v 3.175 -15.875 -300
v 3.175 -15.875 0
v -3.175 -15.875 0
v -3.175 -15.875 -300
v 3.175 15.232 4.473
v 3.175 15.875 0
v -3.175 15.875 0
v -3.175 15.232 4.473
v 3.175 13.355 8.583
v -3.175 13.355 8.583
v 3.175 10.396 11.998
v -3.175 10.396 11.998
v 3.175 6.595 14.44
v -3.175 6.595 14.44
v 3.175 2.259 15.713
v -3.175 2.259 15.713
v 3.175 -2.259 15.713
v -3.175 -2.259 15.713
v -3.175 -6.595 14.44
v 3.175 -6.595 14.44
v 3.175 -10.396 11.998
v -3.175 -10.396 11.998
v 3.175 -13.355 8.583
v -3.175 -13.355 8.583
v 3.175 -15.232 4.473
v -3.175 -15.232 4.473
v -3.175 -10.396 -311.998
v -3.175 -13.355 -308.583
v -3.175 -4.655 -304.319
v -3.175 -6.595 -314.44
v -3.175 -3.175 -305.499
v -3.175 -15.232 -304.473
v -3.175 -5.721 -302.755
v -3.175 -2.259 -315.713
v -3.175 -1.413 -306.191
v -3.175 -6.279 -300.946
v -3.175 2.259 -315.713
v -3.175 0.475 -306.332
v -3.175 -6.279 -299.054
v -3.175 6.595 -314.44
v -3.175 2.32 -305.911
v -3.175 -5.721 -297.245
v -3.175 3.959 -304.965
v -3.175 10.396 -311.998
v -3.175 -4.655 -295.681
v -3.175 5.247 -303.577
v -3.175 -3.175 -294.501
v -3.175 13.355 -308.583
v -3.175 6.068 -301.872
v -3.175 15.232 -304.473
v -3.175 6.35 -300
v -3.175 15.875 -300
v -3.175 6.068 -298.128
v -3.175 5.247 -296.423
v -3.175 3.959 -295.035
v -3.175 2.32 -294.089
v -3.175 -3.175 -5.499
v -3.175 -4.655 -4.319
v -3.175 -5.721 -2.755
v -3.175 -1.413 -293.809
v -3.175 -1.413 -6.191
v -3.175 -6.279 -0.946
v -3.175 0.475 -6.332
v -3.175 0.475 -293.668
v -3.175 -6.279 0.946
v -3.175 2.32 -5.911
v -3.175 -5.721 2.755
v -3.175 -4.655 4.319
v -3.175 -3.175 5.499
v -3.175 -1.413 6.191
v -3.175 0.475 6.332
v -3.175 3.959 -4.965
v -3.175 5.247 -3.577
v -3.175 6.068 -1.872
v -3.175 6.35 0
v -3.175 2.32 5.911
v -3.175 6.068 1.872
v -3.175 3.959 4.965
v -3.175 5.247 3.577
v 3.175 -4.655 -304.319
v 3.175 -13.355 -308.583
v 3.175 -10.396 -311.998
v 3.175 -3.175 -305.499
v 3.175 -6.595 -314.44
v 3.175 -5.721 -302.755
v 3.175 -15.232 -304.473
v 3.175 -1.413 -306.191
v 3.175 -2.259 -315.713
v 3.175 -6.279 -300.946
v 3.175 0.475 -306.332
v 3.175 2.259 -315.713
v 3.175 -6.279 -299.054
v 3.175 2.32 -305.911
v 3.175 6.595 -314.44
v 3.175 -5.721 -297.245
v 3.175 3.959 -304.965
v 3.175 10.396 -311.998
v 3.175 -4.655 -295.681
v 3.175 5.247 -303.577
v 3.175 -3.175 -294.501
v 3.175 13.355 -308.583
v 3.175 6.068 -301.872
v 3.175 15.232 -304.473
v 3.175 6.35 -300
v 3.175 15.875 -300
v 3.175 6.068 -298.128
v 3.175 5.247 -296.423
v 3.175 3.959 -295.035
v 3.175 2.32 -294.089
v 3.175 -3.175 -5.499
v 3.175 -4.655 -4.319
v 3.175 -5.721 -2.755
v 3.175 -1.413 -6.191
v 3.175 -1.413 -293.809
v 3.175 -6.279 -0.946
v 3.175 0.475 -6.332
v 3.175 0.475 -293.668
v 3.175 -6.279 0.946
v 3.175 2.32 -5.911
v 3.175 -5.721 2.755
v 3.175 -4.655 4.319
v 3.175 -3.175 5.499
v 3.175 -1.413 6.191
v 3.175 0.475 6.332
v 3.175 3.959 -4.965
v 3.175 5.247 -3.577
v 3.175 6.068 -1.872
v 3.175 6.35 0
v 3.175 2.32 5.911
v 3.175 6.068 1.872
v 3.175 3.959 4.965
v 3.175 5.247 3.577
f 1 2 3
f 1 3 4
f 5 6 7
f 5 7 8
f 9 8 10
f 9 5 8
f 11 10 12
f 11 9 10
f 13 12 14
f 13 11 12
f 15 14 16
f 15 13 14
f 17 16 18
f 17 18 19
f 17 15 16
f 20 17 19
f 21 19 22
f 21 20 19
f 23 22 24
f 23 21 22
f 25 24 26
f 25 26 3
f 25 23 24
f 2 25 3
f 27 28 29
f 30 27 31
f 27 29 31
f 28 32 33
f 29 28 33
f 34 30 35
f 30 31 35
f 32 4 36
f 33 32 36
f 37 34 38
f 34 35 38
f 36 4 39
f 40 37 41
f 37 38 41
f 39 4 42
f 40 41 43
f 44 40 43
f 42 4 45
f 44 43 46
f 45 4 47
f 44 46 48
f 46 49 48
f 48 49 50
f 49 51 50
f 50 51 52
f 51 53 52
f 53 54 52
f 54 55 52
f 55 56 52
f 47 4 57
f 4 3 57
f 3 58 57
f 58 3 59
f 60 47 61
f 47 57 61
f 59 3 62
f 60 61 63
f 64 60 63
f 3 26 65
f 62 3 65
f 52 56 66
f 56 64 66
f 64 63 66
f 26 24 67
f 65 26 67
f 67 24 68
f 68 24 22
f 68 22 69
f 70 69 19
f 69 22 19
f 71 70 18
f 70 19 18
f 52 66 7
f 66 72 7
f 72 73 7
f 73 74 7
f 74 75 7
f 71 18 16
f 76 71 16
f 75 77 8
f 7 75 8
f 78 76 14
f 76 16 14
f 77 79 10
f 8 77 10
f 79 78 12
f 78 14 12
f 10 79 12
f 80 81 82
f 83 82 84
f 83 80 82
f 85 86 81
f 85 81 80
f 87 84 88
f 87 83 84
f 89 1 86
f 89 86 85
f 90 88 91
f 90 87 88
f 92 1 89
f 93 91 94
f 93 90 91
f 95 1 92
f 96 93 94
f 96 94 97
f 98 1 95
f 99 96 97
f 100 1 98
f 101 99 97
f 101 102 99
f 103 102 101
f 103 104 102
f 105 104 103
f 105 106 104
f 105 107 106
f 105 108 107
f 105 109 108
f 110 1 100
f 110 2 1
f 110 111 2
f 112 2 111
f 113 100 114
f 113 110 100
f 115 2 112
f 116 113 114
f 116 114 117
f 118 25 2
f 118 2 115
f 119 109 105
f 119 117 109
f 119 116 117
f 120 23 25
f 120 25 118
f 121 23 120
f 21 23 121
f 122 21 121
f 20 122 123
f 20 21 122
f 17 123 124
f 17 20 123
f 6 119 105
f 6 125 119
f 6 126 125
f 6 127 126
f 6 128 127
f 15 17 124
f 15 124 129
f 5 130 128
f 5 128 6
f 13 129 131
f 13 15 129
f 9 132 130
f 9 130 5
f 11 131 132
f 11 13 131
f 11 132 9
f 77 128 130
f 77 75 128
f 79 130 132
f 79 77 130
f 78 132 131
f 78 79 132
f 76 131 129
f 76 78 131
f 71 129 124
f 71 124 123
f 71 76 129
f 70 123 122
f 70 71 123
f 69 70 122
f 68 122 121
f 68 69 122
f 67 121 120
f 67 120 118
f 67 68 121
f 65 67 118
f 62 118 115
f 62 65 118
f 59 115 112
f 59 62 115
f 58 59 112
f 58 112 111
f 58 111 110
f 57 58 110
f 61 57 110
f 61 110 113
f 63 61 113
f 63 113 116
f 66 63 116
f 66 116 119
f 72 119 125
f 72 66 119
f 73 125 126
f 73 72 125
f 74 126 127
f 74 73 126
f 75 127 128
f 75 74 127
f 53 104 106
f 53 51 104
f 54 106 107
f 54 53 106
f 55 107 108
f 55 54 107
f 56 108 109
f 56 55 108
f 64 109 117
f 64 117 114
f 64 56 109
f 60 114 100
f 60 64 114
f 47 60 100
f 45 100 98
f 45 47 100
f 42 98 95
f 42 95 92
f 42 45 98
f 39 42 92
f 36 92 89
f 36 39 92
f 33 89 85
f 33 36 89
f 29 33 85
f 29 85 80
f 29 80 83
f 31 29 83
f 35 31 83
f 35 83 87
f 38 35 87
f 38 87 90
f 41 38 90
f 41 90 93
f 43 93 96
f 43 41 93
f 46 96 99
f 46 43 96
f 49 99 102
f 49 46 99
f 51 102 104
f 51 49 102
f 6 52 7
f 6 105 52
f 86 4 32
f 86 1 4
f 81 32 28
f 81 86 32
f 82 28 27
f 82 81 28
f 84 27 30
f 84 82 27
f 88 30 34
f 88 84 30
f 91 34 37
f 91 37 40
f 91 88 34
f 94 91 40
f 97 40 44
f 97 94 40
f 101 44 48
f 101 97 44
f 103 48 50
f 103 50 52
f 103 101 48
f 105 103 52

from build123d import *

# Parameters (mm, degrees)
F0_R     = 6.35
F1_DEPTH = 3.175


with BuildPart() as f1:
    # F0 (on Right) → F1 (new body, symmetric)
    with BuildSketch(Plane.YZ):
        with BuildLine():
            Line((15.875, -300), (15.875, 0))
            ThreePointArc((15.875, 0), (0, 15.875), (-15.875, 0))
            Line((-15.875, 0), (-15.875, -300))
            ThreePointArc((-15.875, -300), (0, -315.875), (15.875, -300))
        make_face()
        with Locations((0, -300)):
            Circle(F0_R, mode=Mode.SUBTRACT)
        Circle(F0_R, mode=Mode.SUBTRACT)
    extrude(amount=F1_DEPTH, both=True)


solid = f1.part
